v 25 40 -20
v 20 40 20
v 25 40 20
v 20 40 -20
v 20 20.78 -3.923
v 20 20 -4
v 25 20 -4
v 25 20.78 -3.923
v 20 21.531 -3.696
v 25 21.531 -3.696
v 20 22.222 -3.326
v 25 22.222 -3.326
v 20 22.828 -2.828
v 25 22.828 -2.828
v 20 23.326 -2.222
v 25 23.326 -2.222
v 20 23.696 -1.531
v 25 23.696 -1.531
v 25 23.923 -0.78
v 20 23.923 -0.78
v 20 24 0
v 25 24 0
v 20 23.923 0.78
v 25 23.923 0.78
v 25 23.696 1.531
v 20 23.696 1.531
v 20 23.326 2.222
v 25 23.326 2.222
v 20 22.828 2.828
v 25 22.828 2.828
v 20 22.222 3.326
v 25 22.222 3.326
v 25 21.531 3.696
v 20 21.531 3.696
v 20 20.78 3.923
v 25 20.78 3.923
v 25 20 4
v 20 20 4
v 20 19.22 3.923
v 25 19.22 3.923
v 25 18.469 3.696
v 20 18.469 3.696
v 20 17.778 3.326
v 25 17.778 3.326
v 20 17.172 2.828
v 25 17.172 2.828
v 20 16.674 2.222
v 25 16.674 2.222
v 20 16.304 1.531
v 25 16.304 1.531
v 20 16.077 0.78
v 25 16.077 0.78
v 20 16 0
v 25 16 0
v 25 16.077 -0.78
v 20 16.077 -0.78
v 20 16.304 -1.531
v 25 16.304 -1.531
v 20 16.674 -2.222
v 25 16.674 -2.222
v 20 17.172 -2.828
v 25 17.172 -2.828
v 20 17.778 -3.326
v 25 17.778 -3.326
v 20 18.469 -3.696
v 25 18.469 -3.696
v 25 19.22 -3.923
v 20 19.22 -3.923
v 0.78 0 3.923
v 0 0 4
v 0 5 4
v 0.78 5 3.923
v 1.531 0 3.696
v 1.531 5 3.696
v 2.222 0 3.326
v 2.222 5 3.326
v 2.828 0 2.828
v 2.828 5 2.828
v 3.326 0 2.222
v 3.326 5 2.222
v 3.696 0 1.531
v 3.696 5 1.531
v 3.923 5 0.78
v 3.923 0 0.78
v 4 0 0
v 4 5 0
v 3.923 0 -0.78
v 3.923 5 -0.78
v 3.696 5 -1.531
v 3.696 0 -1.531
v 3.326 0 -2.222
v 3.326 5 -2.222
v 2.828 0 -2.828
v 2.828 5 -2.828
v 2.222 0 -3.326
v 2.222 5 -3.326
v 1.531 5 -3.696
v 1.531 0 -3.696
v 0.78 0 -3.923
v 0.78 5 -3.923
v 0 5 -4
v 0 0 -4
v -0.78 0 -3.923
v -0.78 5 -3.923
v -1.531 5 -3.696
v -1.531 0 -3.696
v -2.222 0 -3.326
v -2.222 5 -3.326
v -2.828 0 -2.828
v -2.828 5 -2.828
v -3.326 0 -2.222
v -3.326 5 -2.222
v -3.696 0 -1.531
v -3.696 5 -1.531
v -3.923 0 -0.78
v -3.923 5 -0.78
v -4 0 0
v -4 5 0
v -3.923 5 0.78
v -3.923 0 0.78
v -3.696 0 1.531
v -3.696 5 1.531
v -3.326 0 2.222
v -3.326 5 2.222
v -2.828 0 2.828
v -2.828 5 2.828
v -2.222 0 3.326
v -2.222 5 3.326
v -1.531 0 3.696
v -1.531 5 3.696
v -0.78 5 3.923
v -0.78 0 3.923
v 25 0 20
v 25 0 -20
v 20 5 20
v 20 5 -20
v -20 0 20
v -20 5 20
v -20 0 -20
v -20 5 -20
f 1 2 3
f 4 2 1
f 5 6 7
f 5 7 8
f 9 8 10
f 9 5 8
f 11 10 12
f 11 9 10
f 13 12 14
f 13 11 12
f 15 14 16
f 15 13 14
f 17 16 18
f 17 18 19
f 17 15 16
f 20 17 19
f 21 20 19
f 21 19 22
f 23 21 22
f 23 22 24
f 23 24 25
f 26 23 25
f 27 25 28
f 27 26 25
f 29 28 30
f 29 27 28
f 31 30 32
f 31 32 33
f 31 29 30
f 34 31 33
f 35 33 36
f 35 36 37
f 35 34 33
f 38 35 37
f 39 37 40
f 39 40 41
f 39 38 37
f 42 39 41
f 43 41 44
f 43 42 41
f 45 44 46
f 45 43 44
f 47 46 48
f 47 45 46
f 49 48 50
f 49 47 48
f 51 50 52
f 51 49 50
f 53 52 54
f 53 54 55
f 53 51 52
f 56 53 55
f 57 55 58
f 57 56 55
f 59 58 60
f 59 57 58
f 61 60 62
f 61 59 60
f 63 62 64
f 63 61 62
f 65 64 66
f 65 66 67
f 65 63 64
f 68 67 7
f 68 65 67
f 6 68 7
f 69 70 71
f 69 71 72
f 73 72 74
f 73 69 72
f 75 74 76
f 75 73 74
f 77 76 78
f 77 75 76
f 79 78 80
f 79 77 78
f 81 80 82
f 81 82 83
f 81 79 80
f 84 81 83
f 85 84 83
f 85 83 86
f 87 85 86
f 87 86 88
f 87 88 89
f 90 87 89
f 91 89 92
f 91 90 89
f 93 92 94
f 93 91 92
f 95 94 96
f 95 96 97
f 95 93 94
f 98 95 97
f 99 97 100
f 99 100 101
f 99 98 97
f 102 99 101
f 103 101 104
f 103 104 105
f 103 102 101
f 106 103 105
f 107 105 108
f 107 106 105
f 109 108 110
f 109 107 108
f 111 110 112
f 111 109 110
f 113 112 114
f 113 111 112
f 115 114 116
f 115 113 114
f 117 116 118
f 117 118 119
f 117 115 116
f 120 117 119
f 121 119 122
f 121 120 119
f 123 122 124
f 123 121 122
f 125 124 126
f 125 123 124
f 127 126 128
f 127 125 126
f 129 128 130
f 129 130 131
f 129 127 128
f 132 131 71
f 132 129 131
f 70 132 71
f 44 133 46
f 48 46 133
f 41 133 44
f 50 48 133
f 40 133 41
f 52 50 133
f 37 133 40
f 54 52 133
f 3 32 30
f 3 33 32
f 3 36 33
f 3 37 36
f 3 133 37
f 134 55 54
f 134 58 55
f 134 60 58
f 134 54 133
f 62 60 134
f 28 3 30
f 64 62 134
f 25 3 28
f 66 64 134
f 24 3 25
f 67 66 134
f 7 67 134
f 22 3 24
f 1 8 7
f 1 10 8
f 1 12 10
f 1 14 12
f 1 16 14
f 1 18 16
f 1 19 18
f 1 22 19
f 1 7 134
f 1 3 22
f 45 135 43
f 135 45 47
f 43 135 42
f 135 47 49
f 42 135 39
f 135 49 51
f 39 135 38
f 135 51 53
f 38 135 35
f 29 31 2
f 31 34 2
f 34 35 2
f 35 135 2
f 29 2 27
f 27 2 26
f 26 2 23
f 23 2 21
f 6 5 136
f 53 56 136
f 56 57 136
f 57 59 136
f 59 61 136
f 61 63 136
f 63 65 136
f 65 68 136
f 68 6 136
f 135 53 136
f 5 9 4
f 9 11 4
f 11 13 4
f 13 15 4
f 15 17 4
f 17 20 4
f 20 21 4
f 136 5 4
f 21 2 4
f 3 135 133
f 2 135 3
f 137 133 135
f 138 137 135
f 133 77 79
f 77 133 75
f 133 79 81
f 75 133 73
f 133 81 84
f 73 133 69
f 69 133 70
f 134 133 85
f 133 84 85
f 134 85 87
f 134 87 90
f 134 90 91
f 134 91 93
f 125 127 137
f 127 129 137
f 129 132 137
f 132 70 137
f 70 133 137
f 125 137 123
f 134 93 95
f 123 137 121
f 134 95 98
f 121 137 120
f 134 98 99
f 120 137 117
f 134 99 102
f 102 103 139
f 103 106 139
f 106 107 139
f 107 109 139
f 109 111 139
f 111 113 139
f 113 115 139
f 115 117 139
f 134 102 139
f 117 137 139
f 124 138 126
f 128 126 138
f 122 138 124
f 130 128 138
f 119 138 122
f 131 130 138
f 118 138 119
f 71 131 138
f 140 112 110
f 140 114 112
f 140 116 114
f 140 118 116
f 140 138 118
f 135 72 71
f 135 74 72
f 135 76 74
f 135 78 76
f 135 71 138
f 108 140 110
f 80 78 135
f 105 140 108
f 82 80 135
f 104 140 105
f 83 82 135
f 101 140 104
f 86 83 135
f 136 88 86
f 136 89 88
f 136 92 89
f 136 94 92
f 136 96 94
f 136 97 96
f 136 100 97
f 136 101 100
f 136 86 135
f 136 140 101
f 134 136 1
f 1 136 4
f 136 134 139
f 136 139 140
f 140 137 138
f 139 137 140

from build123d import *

# Parameters (mm, degrees)
SKETCH1_W           = 40
SKETCH1_H           = 40
SKETCH1_R           = 4
BOSS_EXTRUDE1_DEPTH = 5
SKETCH2_W           = 40
SKETCH2_H           = 40
SKETCH2_R           = 4
BOSS_EXTRUDE2_DEPTH = 5


with BuildPart() as part:
    # Sketch1 → Boss-Extrude1 (new body)
    with BuildSketch(Plane(origin=(0, 0, 0), x_dir=(1, 0, 0), z_dir=(0, 1, 0))):
        Rectangle(SKETCH1_W, SKETCH1_H)
        with Locations(Location((0, 0, 0), (0, 0, 270))):
            Circle(SKETCH1_R, mode=Mode.SUBTRACT)
    extrude(amount=BOSS_EXTRUDE1_DEPTH)

    # Sketch2 → Boss-Extrude2 (add)
    with BuildSketch(Plane(origin=(20, 0, 0), x_dir=(0, 0, -1), z_dir=(1, 0, 0))):
        with Locations((0, 20)):
            Rectangle(SKETCH2_W, SKETCH2_H)
        with Locations((0, 20)):
            Circle(SKETCH2_R, mode=Mode.SUBTRACT)
    extrude(amount=BOSS_EXTRUDE2_DEPTH)


solid = part.part
